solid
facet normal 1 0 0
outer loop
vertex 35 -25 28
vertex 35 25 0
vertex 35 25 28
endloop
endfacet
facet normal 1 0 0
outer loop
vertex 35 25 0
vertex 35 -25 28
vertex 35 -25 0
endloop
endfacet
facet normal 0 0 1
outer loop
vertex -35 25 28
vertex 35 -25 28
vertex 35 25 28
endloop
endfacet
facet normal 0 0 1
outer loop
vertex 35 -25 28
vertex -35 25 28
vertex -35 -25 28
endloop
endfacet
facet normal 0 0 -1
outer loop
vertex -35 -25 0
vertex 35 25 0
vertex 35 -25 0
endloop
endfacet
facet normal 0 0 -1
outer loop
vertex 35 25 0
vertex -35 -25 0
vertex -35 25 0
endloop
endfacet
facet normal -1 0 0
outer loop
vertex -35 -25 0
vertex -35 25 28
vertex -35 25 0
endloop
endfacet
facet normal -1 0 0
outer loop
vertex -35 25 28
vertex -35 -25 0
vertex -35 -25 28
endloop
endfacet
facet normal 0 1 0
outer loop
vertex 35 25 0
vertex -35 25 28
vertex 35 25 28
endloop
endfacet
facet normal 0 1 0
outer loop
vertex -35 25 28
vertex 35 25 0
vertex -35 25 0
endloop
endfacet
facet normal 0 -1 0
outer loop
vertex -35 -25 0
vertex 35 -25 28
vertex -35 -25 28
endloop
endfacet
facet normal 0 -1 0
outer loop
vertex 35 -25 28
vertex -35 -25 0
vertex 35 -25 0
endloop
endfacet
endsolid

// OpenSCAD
// Two-part enclosure for small electronics board
// Print orientation: box standing on bed, lid flat on bed (overhangs into box)

// ---------- Parameters ----------
box_x      = 70;    // box outer length (X)
box_y      = 50;    // box outer width (Y)
box_z      = 30;    // box outer height (Z)
box_wall   = 2;     // box wall thickness
box_floor  = 2;     // box floor thickness

lip_t      = 1.5;   // lip wall thickness
lip_h      = 4;     // lip height above plate
lip_x      = 65.6;  // lip outer length (X)
lip_y      = 45.6;  // lip outer width (Y)
lip_over   = 0.2;   // lip clearance per side (outer - inner)/2

eps        = 0.5;   // cutter overshoot
$fn        = 64;

// ---------- Derived ----------
box_inner_x = box_x - 2*box_wall;
box_inner_y = box_y - 2*box_wall;
plate_t     = 2;    // lid plate thickness

// ---------- Model ----------
union() {
    // Box body (open top)
    difference() {
        translate([-box_x/2, -box_y/2, 0])
            cube([box_x, box_y, box_z - box_floor]);
        translate([-box_inner_x/2, -box_inner_y/2, -eps])
            cube([box_inner_x, box_inner_y, box_floor + eps]);
    }

    // Lid: plate + centred lip
    union() {
        translate([-box_x/2, -box_y/2, 0])
            cube([box_x, box_y, plate_t]);
        translate([-lip_x/2, -lip_y/2, plate_t])
            cube([lip_x, lip_y, lip_h]);
    }
}
